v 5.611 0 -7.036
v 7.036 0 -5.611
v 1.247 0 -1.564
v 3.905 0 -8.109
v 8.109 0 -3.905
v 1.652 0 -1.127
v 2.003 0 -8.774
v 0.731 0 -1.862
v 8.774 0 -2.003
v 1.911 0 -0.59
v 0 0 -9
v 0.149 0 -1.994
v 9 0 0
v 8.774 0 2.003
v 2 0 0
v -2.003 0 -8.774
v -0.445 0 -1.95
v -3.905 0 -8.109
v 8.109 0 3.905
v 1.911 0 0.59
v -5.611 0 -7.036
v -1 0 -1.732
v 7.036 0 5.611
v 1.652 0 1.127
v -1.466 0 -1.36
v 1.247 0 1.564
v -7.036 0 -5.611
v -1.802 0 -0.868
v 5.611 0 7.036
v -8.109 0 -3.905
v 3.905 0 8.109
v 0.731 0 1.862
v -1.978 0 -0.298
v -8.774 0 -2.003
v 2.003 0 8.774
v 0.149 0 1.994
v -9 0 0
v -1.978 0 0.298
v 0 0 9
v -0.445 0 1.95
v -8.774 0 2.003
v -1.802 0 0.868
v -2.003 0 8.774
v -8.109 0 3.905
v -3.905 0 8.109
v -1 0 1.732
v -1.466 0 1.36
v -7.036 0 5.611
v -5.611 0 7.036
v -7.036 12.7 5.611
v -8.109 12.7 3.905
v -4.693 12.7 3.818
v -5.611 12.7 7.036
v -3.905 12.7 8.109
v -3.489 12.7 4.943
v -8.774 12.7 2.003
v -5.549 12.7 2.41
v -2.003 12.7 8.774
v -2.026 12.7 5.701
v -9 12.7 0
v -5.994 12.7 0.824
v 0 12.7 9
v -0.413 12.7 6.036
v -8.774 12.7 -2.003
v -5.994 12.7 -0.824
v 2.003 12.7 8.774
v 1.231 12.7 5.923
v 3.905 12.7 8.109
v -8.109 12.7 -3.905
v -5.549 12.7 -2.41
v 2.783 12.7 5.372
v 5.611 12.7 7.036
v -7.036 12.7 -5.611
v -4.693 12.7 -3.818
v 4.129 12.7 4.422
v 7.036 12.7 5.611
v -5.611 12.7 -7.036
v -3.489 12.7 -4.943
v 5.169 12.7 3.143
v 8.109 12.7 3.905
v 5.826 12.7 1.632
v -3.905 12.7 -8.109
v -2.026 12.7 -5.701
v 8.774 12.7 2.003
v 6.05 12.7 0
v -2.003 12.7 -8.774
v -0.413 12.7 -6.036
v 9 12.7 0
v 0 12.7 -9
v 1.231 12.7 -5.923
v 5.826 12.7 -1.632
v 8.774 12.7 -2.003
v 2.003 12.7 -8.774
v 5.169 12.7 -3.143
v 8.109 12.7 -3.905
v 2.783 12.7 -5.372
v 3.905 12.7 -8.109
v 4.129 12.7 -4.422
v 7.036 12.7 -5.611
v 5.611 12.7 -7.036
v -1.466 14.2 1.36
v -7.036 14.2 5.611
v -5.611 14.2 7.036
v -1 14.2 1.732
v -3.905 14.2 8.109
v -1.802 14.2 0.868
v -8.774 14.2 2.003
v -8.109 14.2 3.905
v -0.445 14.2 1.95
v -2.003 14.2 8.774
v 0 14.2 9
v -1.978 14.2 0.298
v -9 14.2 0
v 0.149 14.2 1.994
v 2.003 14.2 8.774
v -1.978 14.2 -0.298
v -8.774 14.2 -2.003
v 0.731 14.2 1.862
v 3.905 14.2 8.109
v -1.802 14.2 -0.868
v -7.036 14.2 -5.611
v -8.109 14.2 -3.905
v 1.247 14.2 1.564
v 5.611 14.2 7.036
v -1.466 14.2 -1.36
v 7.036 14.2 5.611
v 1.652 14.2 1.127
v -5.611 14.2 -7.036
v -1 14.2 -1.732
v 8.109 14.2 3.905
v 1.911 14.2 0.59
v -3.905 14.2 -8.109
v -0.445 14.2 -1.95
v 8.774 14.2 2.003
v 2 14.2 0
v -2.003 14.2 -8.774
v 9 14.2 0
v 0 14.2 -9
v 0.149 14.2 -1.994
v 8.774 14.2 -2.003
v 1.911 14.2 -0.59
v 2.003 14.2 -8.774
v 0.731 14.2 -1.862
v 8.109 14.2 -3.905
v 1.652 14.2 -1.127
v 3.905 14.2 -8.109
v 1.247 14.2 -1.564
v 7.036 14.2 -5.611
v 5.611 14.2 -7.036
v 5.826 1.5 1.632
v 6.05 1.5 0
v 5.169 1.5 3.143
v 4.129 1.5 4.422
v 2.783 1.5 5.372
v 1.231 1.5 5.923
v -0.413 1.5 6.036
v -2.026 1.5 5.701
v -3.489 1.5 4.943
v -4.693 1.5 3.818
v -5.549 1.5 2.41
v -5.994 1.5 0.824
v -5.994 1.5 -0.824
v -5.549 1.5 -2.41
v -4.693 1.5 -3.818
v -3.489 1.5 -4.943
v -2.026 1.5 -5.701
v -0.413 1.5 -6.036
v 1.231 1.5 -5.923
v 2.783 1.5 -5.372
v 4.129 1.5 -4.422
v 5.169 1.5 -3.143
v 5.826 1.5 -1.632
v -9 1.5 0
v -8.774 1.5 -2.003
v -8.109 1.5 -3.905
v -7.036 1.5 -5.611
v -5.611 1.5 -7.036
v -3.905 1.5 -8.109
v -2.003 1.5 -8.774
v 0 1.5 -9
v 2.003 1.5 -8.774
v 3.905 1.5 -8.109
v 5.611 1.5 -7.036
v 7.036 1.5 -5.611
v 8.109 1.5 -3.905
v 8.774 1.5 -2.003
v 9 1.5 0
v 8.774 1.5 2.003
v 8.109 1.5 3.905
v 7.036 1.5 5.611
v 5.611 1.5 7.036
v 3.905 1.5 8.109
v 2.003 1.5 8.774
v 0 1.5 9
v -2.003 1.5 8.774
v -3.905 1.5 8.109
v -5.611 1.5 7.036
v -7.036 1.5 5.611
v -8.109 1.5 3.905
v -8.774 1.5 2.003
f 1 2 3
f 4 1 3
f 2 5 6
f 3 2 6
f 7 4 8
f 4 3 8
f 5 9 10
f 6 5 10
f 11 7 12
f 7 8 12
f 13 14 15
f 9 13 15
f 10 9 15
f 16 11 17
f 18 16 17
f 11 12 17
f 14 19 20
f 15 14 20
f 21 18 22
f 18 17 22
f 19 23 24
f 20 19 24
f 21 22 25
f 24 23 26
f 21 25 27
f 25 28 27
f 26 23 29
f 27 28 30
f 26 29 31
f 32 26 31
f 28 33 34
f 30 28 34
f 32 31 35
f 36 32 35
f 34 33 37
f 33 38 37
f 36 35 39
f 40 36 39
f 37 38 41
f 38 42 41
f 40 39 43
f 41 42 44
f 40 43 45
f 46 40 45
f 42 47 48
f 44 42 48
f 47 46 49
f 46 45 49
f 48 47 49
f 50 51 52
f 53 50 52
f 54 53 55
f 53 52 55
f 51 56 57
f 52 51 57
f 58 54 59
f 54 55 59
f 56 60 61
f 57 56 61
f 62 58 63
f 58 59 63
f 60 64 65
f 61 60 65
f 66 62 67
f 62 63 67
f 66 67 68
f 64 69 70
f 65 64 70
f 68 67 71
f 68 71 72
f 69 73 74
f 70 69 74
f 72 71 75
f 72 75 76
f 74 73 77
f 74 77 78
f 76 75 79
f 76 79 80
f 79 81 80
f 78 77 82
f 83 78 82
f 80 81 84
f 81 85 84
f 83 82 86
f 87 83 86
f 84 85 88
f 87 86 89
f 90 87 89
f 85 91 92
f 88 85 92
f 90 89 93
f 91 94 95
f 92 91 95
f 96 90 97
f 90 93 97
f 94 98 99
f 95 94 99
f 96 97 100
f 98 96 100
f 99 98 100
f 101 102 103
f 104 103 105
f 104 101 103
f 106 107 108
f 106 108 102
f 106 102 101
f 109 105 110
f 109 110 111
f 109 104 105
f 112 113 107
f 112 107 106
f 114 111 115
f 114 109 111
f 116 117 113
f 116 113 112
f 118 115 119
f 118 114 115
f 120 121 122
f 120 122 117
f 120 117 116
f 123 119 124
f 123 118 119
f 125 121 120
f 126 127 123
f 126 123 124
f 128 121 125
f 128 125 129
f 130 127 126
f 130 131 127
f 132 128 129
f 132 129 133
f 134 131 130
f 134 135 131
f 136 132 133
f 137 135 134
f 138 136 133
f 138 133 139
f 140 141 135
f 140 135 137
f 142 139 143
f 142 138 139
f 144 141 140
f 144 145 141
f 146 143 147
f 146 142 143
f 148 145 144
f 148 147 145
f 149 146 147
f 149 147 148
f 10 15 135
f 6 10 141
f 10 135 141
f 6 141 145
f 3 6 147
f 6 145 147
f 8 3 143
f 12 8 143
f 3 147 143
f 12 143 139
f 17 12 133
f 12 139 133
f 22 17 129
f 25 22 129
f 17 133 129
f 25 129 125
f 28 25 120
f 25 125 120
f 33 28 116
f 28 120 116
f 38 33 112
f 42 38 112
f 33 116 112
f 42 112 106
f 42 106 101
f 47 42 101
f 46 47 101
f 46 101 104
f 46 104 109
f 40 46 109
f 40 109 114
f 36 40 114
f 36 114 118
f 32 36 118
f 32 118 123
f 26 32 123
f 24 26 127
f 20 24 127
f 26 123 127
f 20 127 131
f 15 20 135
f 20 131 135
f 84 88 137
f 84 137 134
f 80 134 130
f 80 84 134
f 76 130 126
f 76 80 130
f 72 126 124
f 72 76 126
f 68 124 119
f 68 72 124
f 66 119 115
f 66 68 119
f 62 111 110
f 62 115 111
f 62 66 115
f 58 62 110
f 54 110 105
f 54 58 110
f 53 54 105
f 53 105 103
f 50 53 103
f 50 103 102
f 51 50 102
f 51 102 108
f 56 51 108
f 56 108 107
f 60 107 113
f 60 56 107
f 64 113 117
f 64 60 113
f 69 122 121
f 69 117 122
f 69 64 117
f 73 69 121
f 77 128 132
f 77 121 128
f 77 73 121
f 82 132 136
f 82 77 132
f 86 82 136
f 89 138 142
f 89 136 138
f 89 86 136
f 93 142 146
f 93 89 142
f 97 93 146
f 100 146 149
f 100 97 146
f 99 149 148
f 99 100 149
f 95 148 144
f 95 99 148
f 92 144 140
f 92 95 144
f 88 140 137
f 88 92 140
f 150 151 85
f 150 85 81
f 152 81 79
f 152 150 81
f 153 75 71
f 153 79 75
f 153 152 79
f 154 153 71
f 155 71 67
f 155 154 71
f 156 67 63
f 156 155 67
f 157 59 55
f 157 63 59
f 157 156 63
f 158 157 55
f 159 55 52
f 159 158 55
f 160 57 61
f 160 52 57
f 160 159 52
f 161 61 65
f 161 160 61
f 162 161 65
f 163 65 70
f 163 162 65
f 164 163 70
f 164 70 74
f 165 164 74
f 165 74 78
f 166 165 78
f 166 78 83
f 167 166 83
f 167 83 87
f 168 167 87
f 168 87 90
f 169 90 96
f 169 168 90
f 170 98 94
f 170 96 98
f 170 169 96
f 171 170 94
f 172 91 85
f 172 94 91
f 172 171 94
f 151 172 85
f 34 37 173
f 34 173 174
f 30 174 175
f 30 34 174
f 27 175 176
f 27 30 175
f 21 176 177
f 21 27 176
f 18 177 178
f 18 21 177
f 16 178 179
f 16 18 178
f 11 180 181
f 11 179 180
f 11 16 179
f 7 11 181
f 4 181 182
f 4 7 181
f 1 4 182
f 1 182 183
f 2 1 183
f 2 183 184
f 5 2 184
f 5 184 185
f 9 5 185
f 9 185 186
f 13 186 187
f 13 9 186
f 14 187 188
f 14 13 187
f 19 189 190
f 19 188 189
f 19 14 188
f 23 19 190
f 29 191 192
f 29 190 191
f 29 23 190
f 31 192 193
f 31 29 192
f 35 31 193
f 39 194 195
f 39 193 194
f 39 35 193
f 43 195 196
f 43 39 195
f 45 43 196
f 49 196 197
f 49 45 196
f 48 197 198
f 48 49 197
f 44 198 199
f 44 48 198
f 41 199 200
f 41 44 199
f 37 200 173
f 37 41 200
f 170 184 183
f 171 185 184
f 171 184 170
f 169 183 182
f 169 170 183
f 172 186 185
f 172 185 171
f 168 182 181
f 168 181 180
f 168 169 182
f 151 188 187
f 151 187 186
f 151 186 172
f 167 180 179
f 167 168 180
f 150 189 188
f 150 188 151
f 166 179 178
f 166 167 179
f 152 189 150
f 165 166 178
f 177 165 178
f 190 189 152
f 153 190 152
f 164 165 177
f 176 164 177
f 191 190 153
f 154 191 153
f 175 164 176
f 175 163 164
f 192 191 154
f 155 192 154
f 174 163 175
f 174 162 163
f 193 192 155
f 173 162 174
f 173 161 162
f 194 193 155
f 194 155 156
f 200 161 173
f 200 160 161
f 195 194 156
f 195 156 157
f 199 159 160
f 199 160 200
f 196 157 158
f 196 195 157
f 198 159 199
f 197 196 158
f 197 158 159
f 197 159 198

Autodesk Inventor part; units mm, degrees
ref_plane "YZ Plane" through (0, 0, 0) normal (1, 0, 0) x (0, 1, 0)
ref_plane "XZ Plane" through (0, 0, 0) normal (0, 1, 0) x (-1, 0, 0)
ref_plane "XY Plane" through (0, 0, 0) normal (0, 0, 1) x (1, 0, 0)
sketch "Sketch1" plane through (0, 0, 0) normal (0, 1, 0) x (-1, 0, 0)
  circle A0 centre (0, 0) radius 9
  dimension "d0" = 18
extrude "Extrusion1" add sketch "Sketch1" along normal blind 1.5
sketch "Sketch2" plane through (0, 1.5, 0) normal (0, 1, 0) x (1, 0, 0)
  circle A0 centre (0, 0) radius 6.05
  dimension "d3" = 12.1
extrude "Extrusion2" add sketch "Sketch2" along normal blind 11.2
sketch "Sketch3" plane through (0, 12.7, 0) normal (0, 1, 0) x (1, 0, 0)
  circle A0 centre (0, 0) radius 9
  dimension "d6" = 18
extrude "Extrusion3" add sketch "Sketch3" along normal blind 1.5
sketch "Sketch4" plane through (0, 14.2, 0) normal (0, 1, 0) x (1, 0, 0)
  circle A0 centre (0, 0) radius 6.05 projected
  circle A1 centre (0, 0) radius 2
  dimension "d9" = 4
extrude "Extrusion4" cut sketch "Sketch4" against normal through all contours A1
properties part number "10mm_Idle_Pulley_3M"
